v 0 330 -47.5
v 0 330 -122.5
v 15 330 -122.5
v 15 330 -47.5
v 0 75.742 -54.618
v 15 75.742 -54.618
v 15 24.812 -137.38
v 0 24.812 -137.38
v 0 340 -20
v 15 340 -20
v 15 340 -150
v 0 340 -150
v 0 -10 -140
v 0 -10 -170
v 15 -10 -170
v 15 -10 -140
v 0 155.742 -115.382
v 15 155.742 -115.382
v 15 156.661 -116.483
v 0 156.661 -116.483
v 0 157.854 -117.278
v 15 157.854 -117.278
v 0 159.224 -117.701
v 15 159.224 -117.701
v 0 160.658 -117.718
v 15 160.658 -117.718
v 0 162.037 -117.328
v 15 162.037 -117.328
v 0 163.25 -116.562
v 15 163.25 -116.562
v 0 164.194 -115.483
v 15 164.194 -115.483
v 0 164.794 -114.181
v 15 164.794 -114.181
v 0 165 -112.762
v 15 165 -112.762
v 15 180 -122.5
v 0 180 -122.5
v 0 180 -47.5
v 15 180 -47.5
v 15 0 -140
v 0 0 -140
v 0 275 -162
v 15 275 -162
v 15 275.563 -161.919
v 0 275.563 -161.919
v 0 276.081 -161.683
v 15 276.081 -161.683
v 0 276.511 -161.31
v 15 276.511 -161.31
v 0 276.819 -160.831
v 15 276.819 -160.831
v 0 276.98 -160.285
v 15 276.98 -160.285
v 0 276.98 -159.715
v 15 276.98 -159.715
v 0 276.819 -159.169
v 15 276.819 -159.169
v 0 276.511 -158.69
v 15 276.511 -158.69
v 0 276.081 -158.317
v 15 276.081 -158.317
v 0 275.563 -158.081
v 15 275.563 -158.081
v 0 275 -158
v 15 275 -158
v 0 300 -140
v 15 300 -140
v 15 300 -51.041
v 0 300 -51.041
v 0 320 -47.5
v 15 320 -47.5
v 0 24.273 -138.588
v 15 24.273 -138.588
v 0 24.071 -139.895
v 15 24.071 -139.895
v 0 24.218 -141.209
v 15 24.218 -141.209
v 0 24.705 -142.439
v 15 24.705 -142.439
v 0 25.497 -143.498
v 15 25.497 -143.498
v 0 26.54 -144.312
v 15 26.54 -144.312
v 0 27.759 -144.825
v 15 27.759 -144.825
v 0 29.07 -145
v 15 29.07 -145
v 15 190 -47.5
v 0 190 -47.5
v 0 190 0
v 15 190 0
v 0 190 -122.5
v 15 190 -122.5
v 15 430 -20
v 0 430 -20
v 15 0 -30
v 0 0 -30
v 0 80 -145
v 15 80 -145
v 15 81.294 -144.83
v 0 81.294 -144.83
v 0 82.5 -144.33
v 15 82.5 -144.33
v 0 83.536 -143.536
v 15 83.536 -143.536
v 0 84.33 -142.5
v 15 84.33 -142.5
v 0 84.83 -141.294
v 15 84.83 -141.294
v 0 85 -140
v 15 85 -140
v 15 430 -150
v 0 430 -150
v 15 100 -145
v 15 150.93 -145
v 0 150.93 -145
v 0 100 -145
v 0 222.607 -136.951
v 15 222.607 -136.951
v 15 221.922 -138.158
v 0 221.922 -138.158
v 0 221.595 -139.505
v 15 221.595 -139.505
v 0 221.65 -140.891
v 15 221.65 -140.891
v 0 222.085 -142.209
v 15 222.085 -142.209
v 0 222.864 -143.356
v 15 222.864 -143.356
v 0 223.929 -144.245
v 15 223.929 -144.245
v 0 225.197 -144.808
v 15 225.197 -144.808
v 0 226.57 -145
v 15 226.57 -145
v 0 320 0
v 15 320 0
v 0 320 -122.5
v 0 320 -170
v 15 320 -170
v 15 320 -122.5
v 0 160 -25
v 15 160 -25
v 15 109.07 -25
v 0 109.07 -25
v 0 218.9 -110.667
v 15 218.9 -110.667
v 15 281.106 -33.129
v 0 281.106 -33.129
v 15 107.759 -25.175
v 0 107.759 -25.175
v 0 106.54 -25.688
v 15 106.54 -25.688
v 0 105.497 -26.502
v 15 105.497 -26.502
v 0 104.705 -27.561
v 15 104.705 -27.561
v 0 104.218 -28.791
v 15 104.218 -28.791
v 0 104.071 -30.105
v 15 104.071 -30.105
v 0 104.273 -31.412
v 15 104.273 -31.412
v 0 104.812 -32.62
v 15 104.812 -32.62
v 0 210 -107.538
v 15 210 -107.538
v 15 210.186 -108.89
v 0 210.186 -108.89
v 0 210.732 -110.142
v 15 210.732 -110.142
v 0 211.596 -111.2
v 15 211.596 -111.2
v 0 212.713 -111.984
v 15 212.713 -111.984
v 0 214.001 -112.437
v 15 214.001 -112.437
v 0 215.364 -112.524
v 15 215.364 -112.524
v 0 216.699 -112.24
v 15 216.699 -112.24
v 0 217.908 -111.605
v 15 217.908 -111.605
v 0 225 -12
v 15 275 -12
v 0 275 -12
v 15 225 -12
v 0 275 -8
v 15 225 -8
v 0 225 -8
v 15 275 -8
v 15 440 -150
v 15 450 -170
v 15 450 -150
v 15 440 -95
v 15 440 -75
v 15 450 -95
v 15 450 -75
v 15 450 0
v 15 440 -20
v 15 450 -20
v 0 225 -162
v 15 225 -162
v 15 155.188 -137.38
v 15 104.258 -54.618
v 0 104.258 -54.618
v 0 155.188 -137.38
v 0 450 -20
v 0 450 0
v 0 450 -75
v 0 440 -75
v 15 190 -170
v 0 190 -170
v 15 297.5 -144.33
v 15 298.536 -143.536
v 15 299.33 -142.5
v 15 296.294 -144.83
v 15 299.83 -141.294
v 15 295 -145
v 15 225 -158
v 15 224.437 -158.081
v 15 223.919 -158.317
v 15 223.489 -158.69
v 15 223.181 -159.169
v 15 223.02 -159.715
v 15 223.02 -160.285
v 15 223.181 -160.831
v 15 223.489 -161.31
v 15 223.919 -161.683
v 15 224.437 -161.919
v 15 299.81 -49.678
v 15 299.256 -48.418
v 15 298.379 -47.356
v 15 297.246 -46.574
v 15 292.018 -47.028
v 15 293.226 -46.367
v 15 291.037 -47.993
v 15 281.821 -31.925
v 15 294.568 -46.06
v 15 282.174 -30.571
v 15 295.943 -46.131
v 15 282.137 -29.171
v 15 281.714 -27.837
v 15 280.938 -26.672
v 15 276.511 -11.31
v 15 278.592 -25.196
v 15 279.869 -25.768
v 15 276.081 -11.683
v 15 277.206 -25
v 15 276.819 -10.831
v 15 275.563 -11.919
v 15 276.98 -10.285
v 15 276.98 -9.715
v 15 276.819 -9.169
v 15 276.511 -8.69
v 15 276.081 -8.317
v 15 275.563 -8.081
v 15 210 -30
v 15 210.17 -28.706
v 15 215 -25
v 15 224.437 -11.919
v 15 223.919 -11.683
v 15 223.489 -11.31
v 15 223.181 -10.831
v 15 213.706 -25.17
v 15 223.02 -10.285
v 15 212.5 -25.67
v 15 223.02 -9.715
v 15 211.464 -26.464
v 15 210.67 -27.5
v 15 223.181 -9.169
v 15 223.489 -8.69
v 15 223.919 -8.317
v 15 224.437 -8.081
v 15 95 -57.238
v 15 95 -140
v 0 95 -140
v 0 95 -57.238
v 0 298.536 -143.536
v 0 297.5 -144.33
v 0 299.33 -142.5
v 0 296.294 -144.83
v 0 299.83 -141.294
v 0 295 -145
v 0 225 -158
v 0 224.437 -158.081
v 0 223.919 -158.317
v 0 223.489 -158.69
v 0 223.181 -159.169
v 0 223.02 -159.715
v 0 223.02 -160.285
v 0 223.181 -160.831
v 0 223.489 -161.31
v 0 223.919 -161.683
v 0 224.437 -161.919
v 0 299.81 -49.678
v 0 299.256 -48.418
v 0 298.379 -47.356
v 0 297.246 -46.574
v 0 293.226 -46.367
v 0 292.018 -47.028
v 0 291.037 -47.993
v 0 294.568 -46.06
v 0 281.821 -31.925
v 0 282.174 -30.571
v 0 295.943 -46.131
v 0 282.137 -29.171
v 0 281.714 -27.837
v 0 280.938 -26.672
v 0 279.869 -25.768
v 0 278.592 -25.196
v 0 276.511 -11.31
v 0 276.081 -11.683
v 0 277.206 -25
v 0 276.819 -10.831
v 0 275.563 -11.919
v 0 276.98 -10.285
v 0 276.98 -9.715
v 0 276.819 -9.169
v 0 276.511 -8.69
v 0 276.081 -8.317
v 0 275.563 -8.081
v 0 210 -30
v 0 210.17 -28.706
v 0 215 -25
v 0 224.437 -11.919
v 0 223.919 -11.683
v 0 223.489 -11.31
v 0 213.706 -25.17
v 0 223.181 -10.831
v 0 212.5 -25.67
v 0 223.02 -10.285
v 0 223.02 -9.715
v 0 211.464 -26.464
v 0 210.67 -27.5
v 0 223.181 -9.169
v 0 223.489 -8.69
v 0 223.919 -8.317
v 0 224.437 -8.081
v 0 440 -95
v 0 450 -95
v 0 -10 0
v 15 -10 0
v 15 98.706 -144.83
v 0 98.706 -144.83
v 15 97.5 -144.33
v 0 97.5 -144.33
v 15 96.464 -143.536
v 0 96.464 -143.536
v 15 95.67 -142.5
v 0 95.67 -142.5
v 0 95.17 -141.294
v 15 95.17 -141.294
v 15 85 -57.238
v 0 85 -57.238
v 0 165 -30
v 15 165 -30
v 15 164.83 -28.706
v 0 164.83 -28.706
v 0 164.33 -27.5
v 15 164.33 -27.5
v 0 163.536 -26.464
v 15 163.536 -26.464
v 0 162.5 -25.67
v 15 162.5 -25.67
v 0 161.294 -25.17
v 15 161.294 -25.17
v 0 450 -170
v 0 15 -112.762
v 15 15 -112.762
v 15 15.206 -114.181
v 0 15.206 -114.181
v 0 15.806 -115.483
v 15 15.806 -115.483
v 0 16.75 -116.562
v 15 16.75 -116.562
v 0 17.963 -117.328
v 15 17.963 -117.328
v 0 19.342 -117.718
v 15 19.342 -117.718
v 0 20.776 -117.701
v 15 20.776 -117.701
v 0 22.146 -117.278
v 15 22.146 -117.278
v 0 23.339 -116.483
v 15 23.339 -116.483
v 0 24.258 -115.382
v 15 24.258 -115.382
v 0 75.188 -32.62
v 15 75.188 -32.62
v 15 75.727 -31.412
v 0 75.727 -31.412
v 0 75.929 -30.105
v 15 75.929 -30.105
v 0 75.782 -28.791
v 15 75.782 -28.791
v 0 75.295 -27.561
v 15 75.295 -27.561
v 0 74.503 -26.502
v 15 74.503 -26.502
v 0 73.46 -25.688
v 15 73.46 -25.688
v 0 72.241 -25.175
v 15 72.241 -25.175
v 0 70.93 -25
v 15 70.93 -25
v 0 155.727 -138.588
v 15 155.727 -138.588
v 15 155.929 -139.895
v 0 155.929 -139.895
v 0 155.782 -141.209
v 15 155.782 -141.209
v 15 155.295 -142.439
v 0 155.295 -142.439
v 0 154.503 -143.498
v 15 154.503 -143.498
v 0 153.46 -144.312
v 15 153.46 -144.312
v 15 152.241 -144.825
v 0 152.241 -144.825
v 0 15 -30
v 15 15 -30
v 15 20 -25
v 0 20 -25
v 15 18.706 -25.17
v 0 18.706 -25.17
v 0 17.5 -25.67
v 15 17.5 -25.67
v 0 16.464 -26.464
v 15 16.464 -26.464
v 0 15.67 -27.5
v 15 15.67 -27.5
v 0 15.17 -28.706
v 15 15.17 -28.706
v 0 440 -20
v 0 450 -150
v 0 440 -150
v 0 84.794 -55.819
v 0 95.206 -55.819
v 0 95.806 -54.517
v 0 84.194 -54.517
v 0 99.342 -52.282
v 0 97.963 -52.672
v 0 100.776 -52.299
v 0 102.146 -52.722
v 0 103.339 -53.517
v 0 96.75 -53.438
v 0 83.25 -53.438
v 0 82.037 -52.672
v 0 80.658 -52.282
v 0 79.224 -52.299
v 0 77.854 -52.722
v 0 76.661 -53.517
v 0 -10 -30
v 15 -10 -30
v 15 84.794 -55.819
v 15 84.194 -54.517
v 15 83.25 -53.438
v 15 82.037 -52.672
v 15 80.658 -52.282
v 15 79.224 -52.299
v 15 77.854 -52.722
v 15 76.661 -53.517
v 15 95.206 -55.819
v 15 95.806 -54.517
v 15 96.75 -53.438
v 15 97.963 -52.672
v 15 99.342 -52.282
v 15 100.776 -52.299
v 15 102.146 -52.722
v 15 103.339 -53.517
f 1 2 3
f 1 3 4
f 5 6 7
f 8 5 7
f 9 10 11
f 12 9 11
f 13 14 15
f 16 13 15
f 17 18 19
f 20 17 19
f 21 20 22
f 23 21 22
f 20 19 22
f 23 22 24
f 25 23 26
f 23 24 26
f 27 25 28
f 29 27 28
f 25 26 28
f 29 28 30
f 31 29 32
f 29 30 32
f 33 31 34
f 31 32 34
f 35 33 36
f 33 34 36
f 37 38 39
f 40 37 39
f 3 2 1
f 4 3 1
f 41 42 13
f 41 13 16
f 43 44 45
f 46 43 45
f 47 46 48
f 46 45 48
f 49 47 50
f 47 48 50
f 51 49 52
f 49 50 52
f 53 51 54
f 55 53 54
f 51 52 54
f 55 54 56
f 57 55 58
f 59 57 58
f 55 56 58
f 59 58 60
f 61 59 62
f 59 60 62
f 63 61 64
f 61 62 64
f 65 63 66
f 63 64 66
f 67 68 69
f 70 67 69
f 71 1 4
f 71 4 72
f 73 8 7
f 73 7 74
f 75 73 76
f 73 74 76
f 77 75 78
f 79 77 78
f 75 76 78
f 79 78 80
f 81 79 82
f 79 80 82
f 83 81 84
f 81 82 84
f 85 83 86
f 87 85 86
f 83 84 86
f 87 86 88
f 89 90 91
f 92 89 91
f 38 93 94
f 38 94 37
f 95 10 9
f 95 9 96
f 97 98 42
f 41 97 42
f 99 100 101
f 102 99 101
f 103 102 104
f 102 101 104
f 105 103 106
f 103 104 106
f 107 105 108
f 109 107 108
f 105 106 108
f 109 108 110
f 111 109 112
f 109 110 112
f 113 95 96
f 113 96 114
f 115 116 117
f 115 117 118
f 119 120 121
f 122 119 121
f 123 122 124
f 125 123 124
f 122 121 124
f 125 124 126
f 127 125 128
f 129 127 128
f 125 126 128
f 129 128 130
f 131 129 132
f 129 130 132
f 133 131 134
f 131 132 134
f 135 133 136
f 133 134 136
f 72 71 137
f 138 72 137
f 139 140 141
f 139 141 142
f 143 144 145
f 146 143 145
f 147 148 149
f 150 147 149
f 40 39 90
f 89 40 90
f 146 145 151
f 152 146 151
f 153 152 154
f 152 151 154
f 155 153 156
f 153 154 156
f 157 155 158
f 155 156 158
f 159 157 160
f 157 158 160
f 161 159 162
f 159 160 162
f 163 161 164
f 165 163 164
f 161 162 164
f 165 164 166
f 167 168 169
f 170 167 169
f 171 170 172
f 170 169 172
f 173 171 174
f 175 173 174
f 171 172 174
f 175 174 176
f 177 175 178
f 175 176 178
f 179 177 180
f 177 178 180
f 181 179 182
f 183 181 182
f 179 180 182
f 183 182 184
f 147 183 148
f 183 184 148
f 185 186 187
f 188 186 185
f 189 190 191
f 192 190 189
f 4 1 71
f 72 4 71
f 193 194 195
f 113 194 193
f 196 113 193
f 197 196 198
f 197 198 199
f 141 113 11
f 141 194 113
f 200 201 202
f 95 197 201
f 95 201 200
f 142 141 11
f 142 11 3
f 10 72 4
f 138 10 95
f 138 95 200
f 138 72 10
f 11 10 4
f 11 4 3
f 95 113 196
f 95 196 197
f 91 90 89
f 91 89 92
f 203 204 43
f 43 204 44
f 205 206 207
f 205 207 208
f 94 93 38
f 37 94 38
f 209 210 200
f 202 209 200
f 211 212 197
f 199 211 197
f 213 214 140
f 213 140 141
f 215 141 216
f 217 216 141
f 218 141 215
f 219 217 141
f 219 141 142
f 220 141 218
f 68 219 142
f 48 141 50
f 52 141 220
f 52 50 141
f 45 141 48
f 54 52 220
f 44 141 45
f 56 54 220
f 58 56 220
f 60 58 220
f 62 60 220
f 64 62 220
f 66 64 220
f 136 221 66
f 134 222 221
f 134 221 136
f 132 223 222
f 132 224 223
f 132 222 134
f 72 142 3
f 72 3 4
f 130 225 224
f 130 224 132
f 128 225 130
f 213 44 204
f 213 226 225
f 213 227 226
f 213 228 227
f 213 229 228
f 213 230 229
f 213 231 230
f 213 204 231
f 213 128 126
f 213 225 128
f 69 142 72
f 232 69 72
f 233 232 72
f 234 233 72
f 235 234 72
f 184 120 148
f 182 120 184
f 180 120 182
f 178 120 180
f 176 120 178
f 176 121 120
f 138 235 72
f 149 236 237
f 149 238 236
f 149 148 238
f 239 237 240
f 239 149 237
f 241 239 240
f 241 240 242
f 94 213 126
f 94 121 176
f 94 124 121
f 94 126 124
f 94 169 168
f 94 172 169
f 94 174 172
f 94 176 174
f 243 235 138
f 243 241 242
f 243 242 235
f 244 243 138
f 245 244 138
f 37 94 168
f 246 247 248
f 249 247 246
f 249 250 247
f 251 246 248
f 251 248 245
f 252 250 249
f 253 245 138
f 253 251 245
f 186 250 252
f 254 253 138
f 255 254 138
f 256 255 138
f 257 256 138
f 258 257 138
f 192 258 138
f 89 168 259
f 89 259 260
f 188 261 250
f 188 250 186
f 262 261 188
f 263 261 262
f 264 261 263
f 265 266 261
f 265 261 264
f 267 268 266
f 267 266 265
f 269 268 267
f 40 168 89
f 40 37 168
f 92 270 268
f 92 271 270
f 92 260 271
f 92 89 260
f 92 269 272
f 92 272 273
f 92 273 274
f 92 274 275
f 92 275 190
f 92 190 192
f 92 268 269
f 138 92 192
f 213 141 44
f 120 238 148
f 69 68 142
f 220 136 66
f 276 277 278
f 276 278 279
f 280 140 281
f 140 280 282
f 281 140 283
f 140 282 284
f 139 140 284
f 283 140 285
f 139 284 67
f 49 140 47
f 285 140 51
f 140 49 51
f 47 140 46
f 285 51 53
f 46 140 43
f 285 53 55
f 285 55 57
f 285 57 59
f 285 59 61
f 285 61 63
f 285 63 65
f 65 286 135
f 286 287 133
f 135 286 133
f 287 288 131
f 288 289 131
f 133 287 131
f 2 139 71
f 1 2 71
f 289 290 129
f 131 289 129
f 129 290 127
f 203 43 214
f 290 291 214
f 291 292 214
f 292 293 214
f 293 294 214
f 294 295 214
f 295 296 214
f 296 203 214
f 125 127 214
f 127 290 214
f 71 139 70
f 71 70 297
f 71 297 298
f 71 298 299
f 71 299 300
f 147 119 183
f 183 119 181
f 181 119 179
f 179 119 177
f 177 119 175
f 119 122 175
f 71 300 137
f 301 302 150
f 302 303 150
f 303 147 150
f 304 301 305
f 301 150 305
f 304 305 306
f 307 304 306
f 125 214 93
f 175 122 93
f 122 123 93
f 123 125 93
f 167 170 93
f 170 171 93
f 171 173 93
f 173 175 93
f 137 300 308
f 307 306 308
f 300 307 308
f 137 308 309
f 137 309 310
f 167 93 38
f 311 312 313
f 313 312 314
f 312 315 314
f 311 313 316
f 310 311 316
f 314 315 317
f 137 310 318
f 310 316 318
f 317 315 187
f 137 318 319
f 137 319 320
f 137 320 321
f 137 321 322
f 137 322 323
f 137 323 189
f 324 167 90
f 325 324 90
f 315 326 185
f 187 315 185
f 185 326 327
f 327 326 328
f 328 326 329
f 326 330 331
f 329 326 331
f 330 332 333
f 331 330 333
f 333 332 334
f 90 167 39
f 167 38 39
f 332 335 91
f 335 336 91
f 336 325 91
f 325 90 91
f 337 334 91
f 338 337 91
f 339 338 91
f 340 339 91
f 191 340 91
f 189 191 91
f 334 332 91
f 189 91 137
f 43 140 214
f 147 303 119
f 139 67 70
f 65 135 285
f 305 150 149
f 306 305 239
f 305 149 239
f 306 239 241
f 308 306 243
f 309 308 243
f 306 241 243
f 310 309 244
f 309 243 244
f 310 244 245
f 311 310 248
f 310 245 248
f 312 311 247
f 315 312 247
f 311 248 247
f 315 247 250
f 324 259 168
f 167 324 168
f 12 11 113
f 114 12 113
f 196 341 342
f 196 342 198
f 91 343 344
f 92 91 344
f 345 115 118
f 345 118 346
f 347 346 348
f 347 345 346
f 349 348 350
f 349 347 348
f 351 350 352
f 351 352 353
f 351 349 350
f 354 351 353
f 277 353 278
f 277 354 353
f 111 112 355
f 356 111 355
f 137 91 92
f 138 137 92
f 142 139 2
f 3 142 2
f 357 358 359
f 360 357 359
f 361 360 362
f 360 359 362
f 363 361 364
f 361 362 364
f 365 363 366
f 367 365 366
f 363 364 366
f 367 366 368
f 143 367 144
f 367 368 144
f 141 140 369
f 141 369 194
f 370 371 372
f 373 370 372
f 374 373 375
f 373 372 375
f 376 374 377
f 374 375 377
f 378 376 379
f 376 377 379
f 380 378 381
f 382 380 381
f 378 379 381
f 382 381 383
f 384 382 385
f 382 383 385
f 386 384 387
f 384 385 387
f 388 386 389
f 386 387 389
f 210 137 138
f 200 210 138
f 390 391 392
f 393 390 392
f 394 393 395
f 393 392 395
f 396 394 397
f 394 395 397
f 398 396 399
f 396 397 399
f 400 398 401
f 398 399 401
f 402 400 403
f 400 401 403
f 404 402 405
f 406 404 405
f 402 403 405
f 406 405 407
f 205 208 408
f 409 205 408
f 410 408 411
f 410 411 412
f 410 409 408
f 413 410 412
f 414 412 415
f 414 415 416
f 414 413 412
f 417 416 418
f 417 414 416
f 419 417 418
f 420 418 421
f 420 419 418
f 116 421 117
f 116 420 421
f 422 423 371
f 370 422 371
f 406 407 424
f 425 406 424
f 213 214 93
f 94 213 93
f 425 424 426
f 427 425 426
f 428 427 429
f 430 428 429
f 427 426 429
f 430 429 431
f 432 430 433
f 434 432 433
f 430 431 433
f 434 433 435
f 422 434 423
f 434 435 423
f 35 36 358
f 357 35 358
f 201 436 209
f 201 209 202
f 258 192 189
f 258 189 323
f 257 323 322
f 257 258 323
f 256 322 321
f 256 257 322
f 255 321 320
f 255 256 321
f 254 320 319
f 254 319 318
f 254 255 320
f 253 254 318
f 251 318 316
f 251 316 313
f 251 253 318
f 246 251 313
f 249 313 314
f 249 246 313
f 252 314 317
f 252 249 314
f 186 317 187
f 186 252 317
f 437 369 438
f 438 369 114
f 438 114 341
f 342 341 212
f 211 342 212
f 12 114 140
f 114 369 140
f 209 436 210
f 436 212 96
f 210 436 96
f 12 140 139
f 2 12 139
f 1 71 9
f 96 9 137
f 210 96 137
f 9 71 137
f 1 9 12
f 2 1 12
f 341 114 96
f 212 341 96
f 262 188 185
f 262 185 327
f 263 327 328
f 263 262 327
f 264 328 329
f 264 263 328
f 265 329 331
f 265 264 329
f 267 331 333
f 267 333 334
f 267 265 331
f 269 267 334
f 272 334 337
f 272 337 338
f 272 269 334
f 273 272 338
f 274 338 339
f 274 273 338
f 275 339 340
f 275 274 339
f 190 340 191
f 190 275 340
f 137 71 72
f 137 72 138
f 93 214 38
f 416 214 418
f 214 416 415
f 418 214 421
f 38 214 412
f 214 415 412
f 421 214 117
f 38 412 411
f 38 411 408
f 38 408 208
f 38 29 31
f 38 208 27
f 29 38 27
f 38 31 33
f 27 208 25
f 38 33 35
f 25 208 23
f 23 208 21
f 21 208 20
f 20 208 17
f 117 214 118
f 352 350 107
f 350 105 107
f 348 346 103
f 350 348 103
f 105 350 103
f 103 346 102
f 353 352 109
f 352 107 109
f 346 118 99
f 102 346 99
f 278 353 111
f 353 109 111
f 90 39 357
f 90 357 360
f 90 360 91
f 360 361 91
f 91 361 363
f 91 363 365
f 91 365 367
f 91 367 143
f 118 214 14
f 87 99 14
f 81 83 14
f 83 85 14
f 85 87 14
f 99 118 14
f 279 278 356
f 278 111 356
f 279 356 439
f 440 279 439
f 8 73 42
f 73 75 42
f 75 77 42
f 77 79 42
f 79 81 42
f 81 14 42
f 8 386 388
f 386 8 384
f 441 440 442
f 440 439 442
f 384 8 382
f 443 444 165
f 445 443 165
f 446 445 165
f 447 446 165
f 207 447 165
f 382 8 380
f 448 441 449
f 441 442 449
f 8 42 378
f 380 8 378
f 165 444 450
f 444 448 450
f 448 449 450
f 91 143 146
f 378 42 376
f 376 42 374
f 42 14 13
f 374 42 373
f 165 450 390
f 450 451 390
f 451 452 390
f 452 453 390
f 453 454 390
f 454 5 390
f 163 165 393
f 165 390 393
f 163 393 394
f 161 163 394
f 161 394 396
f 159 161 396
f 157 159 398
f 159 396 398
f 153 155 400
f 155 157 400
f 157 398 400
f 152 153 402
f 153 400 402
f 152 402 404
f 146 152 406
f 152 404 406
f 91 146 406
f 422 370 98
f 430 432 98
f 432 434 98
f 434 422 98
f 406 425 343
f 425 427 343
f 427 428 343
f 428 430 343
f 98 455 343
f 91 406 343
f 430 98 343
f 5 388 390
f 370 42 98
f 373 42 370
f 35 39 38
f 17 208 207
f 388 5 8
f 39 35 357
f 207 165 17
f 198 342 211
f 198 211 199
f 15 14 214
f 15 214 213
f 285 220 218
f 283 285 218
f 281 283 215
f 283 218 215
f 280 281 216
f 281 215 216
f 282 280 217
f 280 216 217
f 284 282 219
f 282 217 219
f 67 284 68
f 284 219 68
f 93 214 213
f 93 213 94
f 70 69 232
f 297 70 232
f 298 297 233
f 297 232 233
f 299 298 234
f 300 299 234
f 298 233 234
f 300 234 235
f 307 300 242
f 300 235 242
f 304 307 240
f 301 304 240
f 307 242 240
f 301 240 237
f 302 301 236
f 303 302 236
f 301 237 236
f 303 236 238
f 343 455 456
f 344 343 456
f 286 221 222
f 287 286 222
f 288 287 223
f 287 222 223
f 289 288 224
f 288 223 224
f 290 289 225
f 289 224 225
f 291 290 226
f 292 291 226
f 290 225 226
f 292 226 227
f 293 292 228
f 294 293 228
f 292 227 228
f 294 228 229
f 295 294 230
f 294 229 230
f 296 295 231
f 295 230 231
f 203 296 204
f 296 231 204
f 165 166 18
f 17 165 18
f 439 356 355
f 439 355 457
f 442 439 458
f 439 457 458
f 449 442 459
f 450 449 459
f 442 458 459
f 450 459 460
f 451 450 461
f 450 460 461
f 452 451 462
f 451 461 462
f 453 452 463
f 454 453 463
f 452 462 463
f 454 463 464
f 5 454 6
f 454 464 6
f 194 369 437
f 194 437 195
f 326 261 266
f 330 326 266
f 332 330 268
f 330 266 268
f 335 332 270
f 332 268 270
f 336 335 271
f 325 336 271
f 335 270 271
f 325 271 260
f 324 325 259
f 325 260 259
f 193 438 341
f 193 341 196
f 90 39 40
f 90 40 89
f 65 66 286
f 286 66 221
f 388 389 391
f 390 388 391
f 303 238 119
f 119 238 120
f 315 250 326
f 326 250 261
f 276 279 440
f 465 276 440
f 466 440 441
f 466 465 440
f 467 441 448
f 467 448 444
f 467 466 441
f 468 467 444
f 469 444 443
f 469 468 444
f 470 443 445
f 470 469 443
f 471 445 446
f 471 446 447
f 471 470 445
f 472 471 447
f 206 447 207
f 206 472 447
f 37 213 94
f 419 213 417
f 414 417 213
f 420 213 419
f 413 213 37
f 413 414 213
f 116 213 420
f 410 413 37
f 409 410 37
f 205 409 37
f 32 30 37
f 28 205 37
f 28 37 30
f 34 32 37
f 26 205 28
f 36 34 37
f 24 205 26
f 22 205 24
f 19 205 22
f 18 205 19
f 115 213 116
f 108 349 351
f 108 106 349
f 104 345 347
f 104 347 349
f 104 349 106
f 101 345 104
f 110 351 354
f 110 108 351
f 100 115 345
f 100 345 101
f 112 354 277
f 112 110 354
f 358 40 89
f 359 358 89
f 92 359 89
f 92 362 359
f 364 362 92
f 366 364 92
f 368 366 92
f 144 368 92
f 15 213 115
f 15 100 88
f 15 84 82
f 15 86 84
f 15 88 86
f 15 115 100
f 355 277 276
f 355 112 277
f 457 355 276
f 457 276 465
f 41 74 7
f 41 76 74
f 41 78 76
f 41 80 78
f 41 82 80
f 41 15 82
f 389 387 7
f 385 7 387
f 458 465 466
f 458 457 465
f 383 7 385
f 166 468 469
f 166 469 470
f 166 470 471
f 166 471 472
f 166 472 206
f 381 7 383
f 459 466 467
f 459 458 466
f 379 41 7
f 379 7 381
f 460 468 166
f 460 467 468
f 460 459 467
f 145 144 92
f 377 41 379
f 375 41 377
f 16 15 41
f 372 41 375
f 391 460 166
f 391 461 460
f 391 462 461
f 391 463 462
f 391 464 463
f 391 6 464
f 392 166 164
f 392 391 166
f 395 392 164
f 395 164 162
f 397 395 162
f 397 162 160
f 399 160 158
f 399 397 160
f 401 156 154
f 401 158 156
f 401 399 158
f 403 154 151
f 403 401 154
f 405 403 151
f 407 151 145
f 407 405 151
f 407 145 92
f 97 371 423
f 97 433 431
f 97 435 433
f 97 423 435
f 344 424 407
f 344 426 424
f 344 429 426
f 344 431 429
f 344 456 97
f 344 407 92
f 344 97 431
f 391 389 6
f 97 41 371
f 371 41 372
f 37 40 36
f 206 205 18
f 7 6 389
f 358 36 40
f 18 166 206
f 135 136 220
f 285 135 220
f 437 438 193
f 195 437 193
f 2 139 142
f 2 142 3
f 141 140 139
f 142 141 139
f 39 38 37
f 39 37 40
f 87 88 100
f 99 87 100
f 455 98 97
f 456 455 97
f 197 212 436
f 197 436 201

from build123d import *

# Parameters (mm, degrees)
SKETCH1_W                = 170
SKETCH1_H                = 410
BOSS_EXTRUDE1_DEPTH      = 15
SKETCH11_W               = 15
SKETCH11_H               = 30
BOSS_EXTRUDE8_DEPTH      = 10
SKETCH14_W               = 15
SKETCH14_H               = 170
BOSS_EXTRUDE9_DEPTH      = 30
SKETCH15_W               = 15
SKETCH15_H               = 20
BOSS_EXTRUDE10_DEPTH     = 10
SKETCH16_W               = 15
SKETCH16_H               = 20
BOSS_EXTRUDE11_DEPTH     = 10
CUT_EXTRUDE1_DEPTH       = 15
SKETCH25_W               = 130
SKETCH25_H               = 90
CUT_EXTRUDE3_DEPTH       = 15
CUT_EXTRUDE4_DEPTH       = 15
CUT_EXTRUDE5_DEPTH       = 15
SPLIT2_SURFACE_1_1_BACK  = 491.637
SPLIT2_SURFACE_1_1_DEPTH = 983.274
SPLIT2_SURFACE_1_2_BACK  = 491.637
SPLIT2_SURFACE_1_2_DEPTH = 983.274
SPLIT2_SURFACE_2_3_BACK  = 491.637
SPLIT2_SURFACE_2_3_DEPTH = 983.274
SPLIT2_SURFACE_2_4_BACK  = 491.637
SPLIT2_SURFACE_2_4_DEPTH = 983.274


with BuildPart() as part:
    # Sketch1 → Boss-Extrude1 (new body)
    with BuildSketch(Plane(origin=(0, 0, 0), x_dir=(0, 0, -1), z_dir=(1, 0, 0))):
        with Locations((85, 205)):
            Rectangle(SKETCH1_W, SKETCH1_H)
    extrude(amount=BOSS_EXTRUDE1_DEPTH)

    # Sketch11 → Boss-Extrude8 (add)
    with BuildSketch(Plane.XZ):
        with Locations((7.5, -15)):
            Rectangle(SKETCH11_W, SKETCH11_H)
        with Locations((7.5, -155)):
            Rectangle(SKETCH11_W, SKETCH11_H)
    extrude(amount=BOSS_EXTRUDE8_DEPTH)

    # Sketch14 → Boss-Extrude9 (add)
    with BuildSketch(Plane(origin=(0, 410, 0), x_dir=(1, 0, 0), z_dir=(0, 1, 0))):
        with Locations((7.5, 85)):
            Rectangle(SKETCH14_W, SKETCH14_H)
    extrude(amount=BOSS_EXTRUDE9_DEPTH)

    # Sketch15 → Boss-Extrude10 (add)
    with BuildSketch(Plane(origin=(0, 440, 0), x_dir=(1, 0, 0), z_dir=(0, 1, 0))):
        with Locations((7.5, 160)):
            Rectangle(SKETCH15_W, SKETCH15_H)
    boss_extrude10 = extrude(amount=BOSS_EXTRUDE10_DEPTH)

    # Mirror1: Boss-Extrude10 across plane
    add(boss_extrude10.mirror(Plane.XY.offset(-85)))

    # Sketch16 → Boss-Extrude11 (add)
    with BuildSketch(Plane(origin=(0, 440, 0), x_dir=(1, 0, 0), z_dir=(0, 1, 0))):
        with Locations((7.5, 85)):
            Rectangle(SKETCH16_W, SKETCH16_H)
    extrude(amount=BOSS_EXTRUDE11_DEPTH)

    # Sketch21 → Cut-Extrude1 (cut)
    with BuildSketch(Plane(origin=(15, 0, 0), x_dir=(0, 0, -1), z_dir=(1, 0, 0))):
        with BuildLine():
            Line((12, 275), (12, 225))
            ThreePointArc((12, 225), (10, 223), (8, 225))
            Line((8, 225), (8, 275))
            ThreePointArc((8, 275), (10, 277), (12, 275))
        make_face()
    cut_extrude1 = extrude(amount=-CUT_EXTRUDE1_DEPTH, mode=Mode.SUBTRACT)

    # Mirror3: Cut-Extrude1 across plane
    add(cut_extrude1.mirror(Plane.XY.offset(-85)), mode=Mode.SUBTRACT)

    # Sketch25 → Cut-Extrude3 (cut)
    with BuildSketch(Plane(origin=(15, 0, 0), x_dir=(0, 0, -1), z_dir=(1, 0, 0))):
        with Locations((85, 385)):
            Rectangle(SKETCH25_W, SKETCH25_H)
    extrude(amount=-CUT_EXTRUDE3_DEPTH, mode=Mode.SUBTRACT)

    # Sketch26 → Cut-Extrude4 (cut)
    with BuildSketch(Plane(origin=(15, 0, 0), x_dir=(0, 0, -1), z_dir=(1, 0, 0))):
        with BuildLine():
            Line((25, 70.930175943), (25, 20))
            ThreePointArc((25, 20), (26.464466094, 16.464466094), (30, 15))
            Line((30, 15), (112.761535907, 15))
            ThreePointArc((112.761535907, 15), (117.572536734, 18.638283788), (115.382023035, 24.258291584))
            Line((115.382023035, 24.258291584), (32.620487128, 75.188467526))
            ThreePointArc((32.620487128, 75.188467526), (27.560987458, 75.294946019), (25, 70.930175943))
        make_face()
        with BuildLine():
            Line((54.617976965, 75.741708416), (137.379512872, 24.811532474))
            ThreePointArc((137.379512872, 24.811532474), (142.439012542, 24.705053981), (145, 29.069824057))
            Line((145, 29.069824057), (145, 80))
            ThreePointArc((145, 80), (143.535533906, 83.535533906), (140, 85))
            Line((140, 85), (57.238464093, 85))
            ThreePointArc((57.238464093, 85), (52.427463266, 81.361716212), (54.617976965, 75.741708416))
        make_face()
        with BuildLine():
            Line((54.617976965, 104.258291584), (137.379512872, 155.188467526))
            ThreePointArc((137.379512872, 155.188467526), (142.439012542, 155.294946019), (145, 150.930175943))
            Line((145, 150.930175943), (145, 100))
            ThreePointArc((145, 100), (143.535533906, 96.464466094), (140, 95))
            Line((140, 95), (57.238464093, 95))
            ThreePointArc((57.238464093, 95), (52.427463266, 98.638283788), (54.617976965, 104.258291584))
        make_face()
        with BuildLine():
            Line((25, 160), (25, 109.069824057))
            ThreePointArc((25, 109.069824057), (27.560987458, 104.705053981), (32.620487128, 104.811532474))
            Line((32.620487128, 104.811532474), (115.382023035, 155.741708416))
            ThreePointArc((115.382023035, 155.741708416), (117.572536734, 161.361716212), (112.761535907, 165))
            Line((112.761535907, 165), (30, 165))
            ThreePointArc((30, 165), (26.464466094, 163.535533906), (25, 160))
        make_face()
    extrude(amount=-CUT_EXTRUDE4_DEPTH, mode=Mode.SUBTRACT)

    # Sketch24 → Cut-Extrude5 (cut)
    with BuildSketch(Plane(origin=(15, 0, 0), x_dir=(0, 0, -1), z_dir=(1, 0, 0))):
        with BuildLine():
            Line((47.992787609, 291.036880054), (136.951446196, 222.60714268))
            ThreePointArc((136.951446196, 222.60714268), (142.208758812, 222.084575999), (145, 226.570262626))
            Line((145, 226.570262626), (145, 295))
            ThreePointArc((145, 295), (143.535533906, 298.535533906), (140, 300))
            Line((140, 300), (51.041341414, 300))
            ThreePointArc((51.041341414, 300), (46.307653648, 296.610031098), (47.992787609, 291.036880054))
        make_face()
        with BuildLine():
            Line((25, 277.20619806), (25, 215))
            ThreePointArc((25, 215), (26.464466094, 211.464466094), (30, 210))
            Line((30, 210), (107.537666209, 210))
            ThreePointArc((107.537666209, 210), (112.254662185, 213.341702993), (110.666538333, 218.900020414))
            Line((110.666538333, 218.900020414), (33.128872124, 281.106218474))
            ThreePointArc((33.128872124, 281.106218474), (27.837173218, 281.71421096), (25, 277.20619806))
        make_face()
    extrude(amount=-CUT_EXTRUDE5_DEPTH, mode=Mode.SUBTRACT)


with BuildPart() as body_2:
    # Split2: the piece behind the surface
    add(part.part)
    # Split2 surface 1: a surface, the sketch's curves swept straight by 983.274 mm
    with BuildLine(Plane(origin=(15, 0, 0), x_dir=(0, 0, -1), z_dir=(1, 0, 0)).offset(-SPLIT2_SURFACE_1_1_BACK), mode=Mode.PRIVATE) as split2_surface_1_1_path:
        Line((170, 320), (122.5, 320))
        Line((122.5, 320), (122.5, 330))
        Line((122.5, 330), (47.5, 330))
        Line((47.5, 330), (47.5, 320))
        Line((47.5, 320), (0, 320))
    split2_surface_1_1 = Shell.extrude(split2_surface_1_1_path.wire(), (1 * SPLIT2_SURFACE_1_1_DEPTH, 0 * SPLIT2_SURFACE_1_1_DEPTH, 0 * SPLIT2_SURFACE_1_1_DEPTH))
    split(bisect_by=split2_surface_1_1, keep=Keep.BOTTOM)


with BuildPart() as part_1:
    add(part.part)

    # Split2: split by a surface, the side it looks to stays
    # Split2 surface 1: a surface, the sketch's curves swept straight by 983.274 mm
    with BuildLine(Plane(origin=(15, 0, 0), x_dir=(0, 0, -1), z_dir=(1, 0, 0)).offset(-SPLIT2_SURFACE_1_2_BACK), mode=Mode.PRIVATE) as split2_surface_1_2_path:
        Line((170, 320), (122.5, 320))
        Line((122.5, 320), (122.5, 330))
        Line((122.5, 330), (47.5, 330))
        Line((47.5, 330), (47.5, 320))
        Line((47.5, 320), (0, 320))
    split2_surface_1_2 = Shell.extrude(split2_surface_1_2_path.wire(), (1 * SPLIT2_SURFACE_1_2_DEPTH, 0 * SPLIT2_SURFACE_1_2_DEPTH, 0 * SPLIT2_SURFACE_1_2_DEPTH))
    split(bisect_by=split2_surface_1_2, keep=Keep.TOP)


with BuildPart() as body_3:
    # Split2 2: the piece behind the surface
    add(part_1.part)
    # Split2 surface 2: a surface, the sketch's curves swept straight by 983.274 mm
    with BuildLine(Plane(origin=(15, 0, 0), x_dir=(0, 0, -1), z_dir=(1, 0, 0)).offset(-SPLIT2_SURFACE_2_3_BACK), mode=Mode.PRIVATE) as split2_surface_2_3_path:
        Line((170, 190), (122.5, 190))
        Line((122.5, 190), (122.5, 180))
        Line((122.5, 180), (47.5, 180))
        Line((47.5, 180), (47.5, 190))
        Line((47.5, 190), (0, 190))
    split2_surface_2_3 = Shell.extrude(split2_surface_2_3_path.wire(), (1 * SPLIT2_SURFACE_2_3_DEPTH, 0 * SPLIT2_SURFACE_2_3_DEPTH, 0 * SPLIT2_SURFACE_2_3_DEPTH))
    split(bisect_by=split2_surface_2_3, keep=Keep.BOTTOM)


with BuildPart() as part_2:
    add(part_1.part)

    # Split2 2: split by a surface, the side it looks to stays
    # Split2 surface 2: a surface, the sketch's curves swept straight by 983.274 mm
    with BuildLine(Plane(origin=(15, 0, 0), x_dir=(0, 0, -1), z_dir=(1, 0, 0)).offset(-SPLIT2_SURFACE_2_4_BACK), mode=Mode.PRIVATE) as split2_surface_2_4_path:
        Line((170, 190), (122.5, 190))
        Line((122.5, 190), (122.5, 180))
        Line((122.5, 180), (47.5, 180))
        Line((47.5, 180), (47.5, 190))
        Line((47.5, 190), (0, 190))
    split2_surface_2_4 = Shell.extrude(split2_surface_2_4_path.wire(), (1 * SPLIT2_SURFACE_2_4_DEPTH, 0 * SPLIT2_SURFACE_2_4_DEPTH, 0 * SPLIT2_SURFACE_2_4_DEPTH))
    split(bisect_by=split2_surface_2_4, keep=Keep.TOP)


solid = Compound([body_2.part, body_3.part, part_2.part])
